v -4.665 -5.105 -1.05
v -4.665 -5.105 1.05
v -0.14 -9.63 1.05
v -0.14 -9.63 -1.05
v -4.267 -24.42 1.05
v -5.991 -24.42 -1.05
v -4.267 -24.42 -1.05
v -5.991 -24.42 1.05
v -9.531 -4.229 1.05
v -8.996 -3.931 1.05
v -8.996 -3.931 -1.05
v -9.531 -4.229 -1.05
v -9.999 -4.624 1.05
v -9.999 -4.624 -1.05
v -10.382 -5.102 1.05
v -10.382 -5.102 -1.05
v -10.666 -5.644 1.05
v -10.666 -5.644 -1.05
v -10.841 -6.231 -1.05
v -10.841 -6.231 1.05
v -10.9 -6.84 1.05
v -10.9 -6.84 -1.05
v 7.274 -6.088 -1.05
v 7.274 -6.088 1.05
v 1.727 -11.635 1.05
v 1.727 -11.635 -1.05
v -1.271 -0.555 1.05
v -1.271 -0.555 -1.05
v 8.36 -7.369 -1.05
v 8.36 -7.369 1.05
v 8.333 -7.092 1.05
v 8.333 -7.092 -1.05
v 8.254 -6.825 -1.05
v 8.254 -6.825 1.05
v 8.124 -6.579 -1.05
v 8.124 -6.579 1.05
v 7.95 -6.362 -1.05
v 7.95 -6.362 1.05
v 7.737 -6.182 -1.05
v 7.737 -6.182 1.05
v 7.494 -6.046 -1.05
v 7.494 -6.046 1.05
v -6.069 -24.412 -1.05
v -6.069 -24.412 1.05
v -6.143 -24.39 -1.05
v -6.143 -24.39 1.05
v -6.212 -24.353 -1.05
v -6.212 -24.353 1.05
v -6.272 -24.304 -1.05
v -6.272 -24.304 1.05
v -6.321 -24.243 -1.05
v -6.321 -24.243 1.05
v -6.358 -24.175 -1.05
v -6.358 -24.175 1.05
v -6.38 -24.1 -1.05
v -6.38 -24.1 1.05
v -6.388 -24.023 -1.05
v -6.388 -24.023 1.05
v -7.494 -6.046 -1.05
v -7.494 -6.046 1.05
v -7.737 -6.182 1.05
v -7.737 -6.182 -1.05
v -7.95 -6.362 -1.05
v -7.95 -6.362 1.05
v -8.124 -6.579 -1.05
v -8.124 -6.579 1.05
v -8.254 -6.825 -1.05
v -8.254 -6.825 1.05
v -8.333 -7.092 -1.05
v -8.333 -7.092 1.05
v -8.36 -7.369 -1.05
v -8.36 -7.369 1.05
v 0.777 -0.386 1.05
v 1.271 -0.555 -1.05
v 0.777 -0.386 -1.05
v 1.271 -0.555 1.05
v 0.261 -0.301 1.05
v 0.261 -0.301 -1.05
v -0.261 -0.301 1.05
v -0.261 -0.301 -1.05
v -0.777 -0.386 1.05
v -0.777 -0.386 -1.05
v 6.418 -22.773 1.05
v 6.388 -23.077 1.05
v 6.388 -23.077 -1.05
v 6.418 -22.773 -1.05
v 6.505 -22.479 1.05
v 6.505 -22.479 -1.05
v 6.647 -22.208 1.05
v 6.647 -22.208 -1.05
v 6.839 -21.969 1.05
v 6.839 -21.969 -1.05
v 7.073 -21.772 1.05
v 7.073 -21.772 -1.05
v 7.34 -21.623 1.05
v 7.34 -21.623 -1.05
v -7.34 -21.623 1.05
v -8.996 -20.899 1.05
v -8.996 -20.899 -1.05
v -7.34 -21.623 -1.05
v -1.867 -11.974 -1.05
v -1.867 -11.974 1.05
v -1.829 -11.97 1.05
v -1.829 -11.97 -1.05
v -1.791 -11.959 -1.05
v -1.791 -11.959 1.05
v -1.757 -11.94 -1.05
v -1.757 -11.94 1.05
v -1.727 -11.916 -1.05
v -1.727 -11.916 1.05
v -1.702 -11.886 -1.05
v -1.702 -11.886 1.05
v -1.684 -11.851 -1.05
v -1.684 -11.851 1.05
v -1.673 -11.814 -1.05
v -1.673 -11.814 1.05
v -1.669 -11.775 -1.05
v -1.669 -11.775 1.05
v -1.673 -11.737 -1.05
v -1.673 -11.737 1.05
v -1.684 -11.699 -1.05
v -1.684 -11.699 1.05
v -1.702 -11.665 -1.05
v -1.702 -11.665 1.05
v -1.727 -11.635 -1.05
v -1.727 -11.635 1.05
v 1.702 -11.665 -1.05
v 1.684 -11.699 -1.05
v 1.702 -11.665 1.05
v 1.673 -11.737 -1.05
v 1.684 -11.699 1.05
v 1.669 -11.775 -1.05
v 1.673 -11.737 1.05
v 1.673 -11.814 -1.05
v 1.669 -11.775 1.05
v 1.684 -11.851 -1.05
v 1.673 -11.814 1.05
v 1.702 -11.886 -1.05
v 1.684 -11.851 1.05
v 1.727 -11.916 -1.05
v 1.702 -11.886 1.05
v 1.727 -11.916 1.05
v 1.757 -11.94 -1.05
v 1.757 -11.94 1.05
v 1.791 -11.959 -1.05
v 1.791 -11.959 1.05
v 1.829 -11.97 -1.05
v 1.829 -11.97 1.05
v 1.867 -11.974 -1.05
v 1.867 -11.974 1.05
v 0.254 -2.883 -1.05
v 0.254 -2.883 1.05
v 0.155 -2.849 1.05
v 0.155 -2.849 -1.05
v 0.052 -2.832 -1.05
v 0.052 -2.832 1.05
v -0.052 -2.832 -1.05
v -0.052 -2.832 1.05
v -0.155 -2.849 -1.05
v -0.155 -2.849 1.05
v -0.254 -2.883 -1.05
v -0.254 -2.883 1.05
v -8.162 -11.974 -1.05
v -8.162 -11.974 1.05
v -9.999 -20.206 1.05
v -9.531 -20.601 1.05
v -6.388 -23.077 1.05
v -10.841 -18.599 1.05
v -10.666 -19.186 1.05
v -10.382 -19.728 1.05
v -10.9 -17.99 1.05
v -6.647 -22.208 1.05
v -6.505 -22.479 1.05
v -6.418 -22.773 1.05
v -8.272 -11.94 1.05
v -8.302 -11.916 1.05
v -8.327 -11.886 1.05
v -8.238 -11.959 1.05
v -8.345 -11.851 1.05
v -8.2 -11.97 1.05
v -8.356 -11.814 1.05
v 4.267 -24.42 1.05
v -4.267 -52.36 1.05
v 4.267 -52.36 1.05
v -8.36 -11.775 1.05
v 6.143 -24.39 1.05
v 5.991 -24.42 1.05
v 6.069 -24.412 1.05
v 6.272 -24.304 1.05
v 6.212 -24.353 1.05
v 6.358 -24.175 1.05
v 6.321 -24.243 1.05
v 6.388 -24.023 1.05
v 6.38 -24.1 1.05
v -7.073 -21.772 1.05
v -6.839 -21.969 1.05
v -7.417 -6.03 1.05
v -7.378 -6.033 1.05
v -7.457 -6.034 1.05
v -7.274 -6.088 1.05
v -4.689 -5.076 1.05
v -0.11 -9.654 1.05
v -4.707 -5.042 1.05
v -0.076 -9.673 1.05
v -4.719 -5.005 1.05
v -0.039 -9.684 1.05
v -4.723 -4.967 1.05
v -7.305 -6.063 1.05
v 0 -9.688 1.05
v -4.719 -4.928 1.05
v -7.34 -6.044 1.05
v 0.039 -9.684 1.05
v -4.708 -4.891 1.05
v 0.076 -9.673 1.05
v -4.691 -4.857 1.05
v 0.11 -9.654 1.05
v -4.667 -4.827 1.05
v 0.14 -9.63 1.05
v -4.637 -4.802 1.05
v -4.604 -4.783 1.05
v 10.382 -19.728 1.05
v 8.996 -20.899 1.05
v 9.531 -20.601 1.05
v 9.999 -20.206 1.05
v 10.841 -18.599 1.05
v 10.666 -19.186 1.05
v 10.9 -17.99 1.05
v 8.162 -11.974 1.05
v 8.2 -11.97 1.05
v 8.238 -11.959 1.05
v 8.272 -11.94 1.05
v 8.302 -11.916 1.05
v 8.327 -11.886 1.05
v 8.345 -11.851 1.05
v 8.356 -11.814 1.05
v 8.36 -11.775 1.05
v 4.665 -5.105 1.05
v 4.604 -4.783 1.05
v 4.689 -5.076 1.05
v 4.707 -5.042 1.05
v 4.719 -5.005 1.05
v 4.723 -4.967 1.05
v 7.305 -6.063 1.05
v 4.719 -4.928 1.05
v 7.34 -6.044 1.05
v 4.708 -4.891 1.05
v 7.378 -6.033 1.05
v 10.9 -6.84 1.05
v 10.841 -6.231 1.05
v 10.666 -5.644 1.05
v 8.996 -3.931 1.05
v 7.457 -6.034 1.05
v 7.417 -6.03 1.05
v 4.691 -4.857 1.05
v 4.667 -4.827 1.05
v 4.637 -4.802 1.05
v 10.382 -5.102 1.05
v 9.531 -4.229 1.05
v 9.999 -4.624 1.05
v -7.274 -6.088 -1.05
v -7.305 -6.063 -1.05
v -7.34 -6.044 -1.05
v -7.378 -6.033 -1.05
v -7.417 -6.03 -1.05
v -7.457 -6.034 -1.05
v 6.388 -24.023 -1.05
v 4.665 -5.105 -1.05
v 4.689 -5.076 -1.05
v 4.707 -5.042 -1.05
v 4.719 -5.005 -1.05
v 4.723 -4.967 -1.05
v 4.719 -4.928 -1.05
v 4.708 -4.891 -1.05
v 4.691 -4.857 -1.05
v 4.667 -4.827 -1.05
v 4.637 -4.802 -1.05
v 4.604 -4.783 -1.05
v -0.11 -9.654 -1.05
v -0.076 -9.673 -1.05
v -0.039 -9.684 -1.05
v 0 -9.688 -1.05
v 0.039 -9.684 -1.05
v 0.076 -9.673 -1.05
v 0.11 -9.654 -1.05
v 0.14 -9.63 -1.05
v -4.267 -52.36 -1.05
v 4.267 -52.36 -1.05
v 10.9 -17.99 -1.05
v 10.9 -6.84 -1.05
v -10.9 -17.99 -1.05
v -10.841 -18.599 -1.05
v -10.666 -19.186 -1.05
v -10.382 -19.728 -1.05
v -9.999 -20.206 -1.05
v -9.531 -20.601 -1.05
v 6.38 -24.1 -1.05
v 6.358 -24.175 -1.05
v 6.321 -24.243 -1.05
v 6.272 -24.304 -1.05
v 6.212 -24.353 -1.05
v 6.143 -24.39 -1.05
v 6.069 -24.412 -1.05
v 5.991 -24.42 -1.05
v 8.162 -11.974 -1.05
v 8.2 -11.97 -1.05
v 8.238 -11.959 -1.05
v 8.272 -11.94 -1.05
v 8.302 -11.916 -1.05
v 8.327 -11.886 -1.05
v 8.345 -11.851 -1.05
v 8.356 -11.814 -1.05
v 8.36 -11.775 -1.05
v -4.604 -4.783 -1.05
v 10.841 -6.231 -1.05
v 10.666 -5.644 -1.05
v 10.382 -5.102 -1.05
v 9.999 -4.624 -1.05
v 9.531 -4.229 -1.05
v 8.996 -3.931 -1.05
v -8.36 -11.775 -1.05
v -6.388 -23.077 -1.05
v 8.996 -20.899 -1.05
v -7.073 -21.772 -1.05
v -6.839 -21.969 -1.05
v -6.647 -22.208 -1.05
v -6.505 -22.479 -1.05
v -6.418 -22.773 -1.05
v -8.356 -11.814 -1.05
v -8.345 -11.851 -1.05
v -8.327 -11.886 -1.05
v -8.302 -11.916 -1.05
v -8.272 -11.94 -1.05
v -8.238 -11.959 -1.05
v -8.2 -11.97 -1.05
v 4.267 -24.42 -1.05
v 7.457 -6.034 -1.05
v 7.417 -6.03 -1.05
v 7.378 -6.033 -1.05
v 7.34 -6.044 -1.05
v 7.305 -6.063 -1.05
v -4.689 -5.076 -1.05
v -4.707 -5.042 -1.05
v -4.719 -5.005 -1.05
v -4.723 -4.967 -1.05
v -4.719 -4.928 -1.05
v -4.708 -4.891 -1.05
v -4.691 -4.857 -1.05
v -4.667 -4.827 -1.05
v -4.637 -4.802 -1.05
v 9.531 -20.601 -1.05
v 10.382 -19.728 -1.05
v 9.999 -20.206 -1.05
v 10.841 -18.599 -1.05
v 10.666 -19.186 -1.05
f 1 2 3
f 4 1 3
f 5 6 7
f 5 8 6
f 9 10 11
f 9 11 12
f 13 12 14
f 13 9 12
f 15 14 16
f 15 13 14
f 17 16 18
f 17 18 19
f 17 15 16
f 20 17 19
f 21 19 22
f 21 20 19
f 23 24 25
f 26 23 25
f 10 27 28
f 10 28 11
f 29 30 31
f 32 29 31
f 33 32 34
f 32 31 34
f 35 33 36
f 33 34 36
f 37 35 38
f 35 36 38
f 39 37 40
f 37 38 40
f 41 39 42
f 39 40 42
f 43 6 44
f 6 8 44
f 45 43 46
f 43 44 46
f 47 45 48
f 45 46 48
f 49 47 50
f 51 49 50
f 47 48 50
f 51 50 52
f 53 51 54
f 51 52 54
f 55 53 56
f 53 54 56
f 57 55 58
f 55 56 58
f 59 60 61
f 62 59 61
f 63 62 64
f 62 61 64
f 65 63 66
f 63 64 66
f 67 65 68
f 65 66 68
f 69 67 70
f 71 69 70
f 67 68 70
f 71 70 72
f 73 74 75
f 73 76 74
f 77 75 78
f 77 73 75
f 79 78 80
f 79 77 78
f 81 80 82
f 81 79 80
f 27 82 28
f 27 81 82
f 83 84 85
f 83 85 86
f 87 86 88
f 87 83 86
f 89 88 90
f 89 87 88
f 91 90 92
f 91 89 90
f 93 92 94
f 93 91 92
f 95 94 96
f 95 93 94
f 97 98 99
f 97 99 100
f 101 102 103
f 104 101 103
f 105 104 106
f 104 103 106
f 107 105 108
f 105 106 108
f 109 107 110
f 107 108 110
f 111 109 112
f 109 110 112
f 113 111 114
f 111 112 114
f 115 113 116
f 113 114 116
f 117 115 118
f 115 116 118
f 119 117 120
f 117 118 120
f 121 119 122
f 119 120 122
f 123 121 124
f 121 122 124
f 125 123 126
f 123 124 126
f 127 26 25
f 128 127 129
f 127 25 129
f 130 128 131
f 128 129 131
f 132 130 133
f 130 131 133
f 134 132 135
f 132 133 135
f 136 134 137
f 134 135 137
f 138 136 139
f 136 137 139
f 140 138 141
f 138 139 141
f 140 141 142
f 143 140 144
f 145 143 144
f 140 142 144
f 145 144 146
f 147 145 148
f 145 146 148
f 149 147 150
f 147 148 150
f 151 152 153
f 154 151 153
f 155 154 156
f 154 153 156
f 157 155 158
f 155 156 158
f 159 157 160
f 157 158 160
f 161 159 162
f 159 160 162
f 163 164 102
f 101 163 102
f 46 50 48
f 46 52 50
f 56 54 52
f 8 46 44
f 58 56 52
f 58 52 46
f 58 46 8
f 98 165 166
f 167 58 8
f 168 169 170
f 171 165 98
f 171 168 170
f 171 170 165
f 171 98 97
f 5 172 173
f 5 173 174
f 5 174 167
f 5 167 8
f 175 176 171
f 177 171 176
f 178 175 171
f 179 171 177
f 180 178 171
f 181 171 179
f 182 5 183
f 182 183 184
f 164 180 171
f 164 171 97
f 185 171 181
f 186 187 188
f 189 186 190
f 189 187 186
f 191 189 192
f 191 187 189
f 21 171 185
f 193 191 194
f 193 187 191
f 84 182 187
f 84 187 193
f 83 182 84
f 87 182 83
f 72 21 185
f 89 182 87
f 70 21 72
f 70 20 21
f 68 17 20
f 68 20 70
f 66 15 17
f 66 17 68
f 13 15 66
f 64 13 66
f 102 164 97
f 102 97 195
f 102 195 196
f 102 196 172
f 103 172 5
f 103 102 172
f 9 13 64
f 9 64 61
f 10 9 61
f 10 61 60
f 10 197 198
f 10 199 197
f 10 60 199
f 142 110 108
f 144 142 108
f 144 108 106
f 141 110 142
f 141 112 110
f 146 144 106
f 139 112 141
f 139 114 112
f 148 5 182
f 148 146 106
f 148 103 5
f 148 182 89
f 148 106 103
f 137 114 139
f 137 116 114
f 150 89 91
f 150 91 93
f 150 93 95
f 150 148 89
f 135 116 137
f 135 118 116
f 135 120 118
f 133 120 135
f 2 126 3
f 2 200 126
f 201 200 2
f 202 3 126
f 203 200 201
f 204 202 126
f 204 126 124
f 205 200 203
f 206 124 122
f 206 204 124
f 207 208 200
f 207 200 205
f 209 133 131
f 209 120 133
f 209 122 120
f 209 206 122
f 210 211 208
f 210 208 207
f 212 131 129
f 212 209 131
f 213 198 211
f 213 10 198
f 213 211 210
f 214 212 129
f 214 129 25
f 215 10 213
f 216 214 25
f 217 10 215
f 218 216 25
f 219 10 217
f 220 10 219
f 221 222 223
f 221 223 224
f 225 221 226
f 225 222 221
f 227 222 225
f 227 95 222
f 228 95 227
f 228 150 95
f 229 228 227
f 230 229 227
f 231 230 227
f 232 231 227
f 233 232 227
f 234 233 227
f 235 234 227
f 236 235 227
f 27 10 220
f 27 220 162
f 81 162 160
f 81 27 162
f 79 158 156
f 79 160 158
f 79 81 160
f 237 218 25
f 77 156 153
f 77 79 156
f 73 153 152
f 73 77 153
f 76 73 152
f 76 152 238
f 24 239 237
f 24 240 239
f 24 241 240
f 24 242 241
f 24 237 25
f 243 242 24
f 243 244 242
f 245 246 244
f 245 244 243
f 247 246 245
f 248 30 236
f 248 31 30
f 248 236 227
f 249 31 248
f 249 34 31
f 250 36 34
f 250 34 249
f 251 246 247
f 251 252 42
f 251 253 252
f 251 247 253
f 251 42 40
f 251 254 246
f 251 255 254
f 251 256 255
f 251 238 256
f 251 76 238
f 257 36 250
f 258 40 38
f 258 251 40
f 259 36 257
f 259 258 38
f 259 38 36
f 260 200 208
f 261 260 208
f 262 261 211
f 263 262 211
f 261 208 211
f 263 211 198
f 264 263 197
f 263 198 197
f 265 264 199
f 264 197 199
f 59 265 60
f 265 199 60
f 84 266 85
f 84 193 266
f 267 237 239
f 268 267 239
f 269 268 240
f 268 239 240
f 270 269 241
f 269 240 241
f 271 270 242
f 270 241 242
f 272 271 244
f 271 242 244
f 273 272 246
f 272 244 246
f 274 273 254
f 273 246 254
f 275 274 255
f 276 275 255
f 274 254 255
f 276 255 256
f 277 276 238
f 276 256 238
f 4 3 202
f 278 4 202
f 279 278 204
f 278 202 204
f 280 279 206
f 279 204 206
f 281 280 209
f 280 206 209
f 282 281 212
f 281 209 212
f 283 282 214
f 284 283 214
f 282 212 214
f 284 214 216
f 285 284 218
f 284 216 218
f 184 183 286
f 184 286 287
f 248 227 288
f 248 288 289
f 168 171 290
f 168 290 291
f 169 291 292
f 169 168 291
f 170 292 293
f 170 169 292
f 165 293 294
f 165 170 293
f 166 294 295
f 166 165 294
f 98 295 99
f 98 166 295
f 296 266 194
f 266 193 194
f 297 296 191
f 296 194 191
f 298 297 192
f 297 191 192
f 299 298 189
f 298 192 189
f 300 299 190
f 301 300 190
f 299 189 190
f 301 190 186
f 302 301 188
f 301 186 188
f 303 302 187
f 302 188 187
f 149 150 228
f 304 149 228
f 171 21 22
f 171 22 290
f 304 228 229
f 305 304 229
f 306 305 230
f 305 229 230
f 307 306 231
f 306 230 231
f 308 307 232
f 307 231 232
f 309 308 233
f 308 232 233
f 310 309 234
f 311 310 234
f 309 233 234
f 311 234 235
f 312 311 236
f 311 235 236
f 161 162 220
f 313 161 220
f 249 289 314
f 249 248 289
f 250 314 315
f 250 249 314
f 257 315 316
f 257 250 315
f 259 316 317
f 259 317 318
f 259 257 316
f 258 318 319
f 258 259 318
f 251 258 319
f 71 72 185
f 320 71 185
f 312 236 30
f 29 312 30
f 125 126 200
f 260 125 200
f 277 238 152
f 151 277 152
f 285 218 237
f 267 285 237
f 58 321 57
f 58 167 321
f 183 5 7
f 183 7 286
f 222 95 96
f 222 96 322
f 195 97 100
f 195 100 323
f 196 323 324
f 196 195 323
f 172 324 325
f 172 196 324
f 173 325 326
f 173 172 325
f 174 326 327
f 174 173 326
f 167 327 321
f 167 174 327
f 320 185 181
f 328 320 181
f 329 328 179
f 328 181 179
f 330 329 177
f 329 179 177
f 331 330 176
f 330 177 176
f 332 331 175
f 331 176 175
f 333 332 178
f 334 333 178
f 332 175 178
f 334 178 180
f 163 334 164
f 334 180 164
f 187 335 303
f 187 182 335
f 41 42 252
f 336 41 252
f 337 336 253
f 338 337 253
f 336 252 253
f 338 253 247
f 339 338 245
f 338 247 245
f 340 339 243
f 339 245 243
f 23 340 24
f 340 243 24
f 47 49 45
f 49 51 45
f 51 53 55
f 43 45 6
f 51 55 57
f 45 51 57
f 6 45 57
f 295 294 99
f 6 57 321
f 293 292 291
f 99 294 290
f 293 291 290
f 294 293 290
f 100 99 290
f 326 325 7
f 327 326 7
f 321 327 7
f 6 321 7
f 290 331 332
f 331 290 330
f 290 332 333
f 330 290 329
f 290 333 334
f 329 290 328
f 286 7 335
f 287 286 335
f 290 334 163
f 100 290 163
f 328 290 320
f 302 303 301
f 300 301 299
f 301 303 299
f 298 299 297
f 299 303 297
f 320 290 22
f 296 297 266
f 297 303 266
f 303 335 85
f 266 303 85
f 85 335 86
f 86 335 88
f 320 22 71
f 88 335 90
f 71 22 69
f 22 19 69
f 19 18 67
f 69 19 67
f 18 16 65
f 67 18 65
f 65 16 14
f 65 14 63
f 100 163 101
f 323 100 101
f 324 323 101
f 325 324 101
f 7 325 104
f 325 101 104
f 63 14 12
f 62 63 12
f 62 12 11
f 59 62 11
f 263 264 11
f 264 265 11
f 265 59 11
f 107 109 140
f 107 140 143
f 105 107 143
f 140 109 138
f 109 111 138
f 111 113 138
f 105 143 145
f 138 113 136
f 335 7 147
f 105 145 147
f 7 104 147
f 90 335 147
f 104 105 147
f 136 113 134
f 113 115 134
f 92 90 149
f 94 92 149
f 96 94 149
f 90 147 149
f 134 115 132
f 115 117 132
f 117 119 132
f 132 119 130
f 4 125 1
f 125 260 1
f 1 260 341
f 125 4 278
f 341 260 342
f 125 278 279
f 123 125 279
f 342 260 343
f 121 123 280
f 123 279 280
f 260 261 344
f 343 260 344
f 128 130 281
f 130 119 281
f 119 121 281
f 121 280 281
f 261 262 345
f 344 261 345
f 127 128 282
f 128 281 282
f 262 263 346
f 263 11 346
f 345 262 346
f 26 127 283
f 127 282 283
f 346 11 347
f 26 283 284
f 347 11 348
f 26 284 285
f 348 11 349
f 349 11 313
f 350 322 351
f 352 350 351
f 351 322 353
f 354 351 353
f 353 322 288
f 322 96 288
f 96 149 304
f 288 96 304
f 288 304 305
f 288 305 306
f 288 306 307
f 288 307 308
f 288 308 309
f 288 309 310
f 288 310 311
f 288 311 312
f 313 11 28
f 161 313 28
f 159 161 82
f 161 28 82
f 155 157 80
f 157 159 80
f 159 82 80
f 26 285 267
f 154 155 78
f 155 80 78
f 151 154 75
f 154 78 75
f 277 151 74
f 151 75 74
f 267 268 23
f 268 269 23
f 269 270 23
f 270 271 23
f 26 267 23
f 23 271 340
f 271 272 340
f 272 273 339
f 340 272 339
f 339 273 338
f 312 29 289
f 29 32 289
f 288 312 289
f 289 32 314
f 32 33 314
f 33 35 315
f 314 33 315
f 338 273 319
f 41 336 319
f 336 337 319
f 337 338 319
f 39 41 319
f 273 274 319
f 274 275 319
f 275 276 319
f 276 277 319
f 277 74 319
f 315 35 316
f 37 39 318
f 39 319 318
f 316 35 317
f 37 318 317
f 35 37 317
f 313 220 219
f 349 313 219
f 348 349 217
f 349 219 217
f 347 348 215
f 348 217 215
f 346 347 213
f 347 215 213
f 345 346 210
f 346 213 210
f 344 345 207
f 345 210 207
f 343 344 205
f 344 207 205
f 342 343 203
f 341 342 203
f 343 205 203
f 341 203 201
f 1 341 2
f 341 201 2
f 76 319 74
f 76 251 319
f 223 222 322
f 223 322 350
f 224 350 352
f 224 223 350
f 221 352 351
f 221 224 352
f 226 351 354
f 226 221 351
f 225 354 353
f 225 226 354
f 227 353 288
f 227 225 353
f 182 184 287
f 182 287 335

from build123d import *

# Parameters (mm, degrees)
F1_DEPTH = 1.05
F2_R     = 0.396875
F4_DEPTH = 2.101


with BuildPart() as f1:
    # F0 (on Top) → F1 (new body, symmetric)
    with BuildSketch(Plane.XY):
        with BuildLine():
            ThreePointArc((1.2711994223, -0.5554208485), (0, -0.2898326497), (-1.2711994223, -0.5554208485))
            Line((-1.2711994223, -0.5554208485), (-8.9961994223, -3.930678876))
            ThreePointArc((-8.9961994223, -3.930678876), (-10.381753956, -5.1016191022), (-10.9, -6.8400906772))
            Line((-10.9, -6.8400906772), (-10.9, -17.9896228211))
            ThreePointArc((-10.9, -17.9896228211), (-10.381753956, -19.7280943961), (-8.9961994223, -20.8990346223))
            Line((-8.9961994223, -20.8990346223), (-7.3400002889, -21.6226720877))
            ThreePointArc((-7.3400002889, -21.6226720877), (-6.647223022, -22.2081422008), (-6.3881, -23.0773779883))
            Line((-6.3881, -23.0773779883), (-6.3881, -24.4198326497))
            Line((-6.3881, -24.4198326497), (-4.2672, -24.4198326497))
            Line((-4.2672, -24.4198326497), (-4.2672, -52.3598326497))
            Line((-4.2672, -52.3598326497), (4.2672, -52.3598326497))
            Line((4.2672, -52.3598326497), (4.2672, -24.4198326497))
            Line((4.2672, -24.4198326497), (6.3881, -24.4198326497))
            Line((6.3881, -24.4198326497), (6.3881, -23.0773779883))
            ThreePointArc((6.3881, -23.0773779883), (6.647223022, -22.2081422008), (7.3400002889, -21.6226720877))
            Line((7.3400002889, -21.6226720877), (8.9961994223, -20.8990346223))
            ThreePointArc((8.9961994223, -20.8990346223), (10.381753956, -19.7280943961), (10.9, -17.9896228211))
            Line((10.9, -17.9896228211), (10.9, -6.8400906772))
            ThreePointArc((10.9, -6.8400906772), (10.381753956, -5.1016191022), (8.9961994223, -3.930678876))
            Line((8.9961994223, -3.930678876), (1.2711994223, -0.5554208485))
        make_face()
    extrude(amount=F1_DEPTH, both=True)

    # F2
    f2_edges = [f1.edges().sort_by_distance(p)[0] for p in [
        (6.3881, -24.419833, 0),
        (-6.3881, -24.419833, 0),
    ]]
    fillet(f2_edges, radius=F2_R)

    # F3 (on face) → F4 (cut, through all)
    with BuildSketch(Plane.XY.offset(1.05)):
        with BuildLine():
            ThreePointArc((0.2542398845, -2.8829502894), (0, -2.8298326497), (-0.2542398845, -2.8829502894))
            Line((-0.2542398845, -2.8829502894), (-4.6036733755, -4.7833335005))
            ThreePointArc((-4.6036733755, -4.7833335005), (-4.7192112161, -4.9283315767), (-4.6645399135, -5.10548824))
            Line((-4.6645399135, -5.10548824), (-0.1403165019, -9.6297116516))
            ThreePointArc((-0.1403165019, -9.6297116516), (0, -9.6878326497), (0.1403165019, -9.6297116516))
            Line((0.1403165019, -9.6297116516), (4.6645399135, -5.10548824))
            ThreePointArc((4.6645399135, -5.10548824), (4.7192112161, -4.9283315767), (4.6036733755, -4.7833335005))
            Line((4.6036733755, -4.7833335005), (0.2542398845, -2.8829502894))
        make_face()
        with BuildLine():
            ThreePointArc((-7.4941261238, -6.0462492082), (-8.1242947921, -6.5788084291), (-8.36, -7.3694884715))
            Line((-8.36, -7.3694884715), (-8.36, -11.7753951497))
            ThreePointArc((-8.36, -11.7753951497), (-8.3018790019, -11.9157116516), (-8.1615625, -11.9738326497))
            Line((-8.1615625, -11.9738326497), (-1.867368456, -11.9738326497))
            ThreePointArc((-1.867368456, -11.9738326497), (-1.6840361113, -11.8513338933), (-1.7270519541, -11.6350786478))
            Line((-1.7270519541, -11.6350786478), (-7.274359658, -6.0877709439))
            ThreePointArc((-7.274359658, -6.0877709439), (-7.3778359984, -6.0330996413), (-7.4941261238, -6.0462492082))
        make_face()
        with BuildLine():
            Line((8.36, -11.7753951497), (8.36, -7.3694884715))
            ThreePointArc((8.36, -7.3694884715), (8.1242947921, -6.5788084291), (7.4941261238, -6.0462492082))
            ThreePointArc((7.4941261238, -6.0462492082), (7.3778359984, -6.0330996413), (7.274359658, -6.0877709439))
            Line((7.274359658, -6.0877709439), (1.7270519541, -11.6350786478))
            ThreePointArc((1.7270519541, -11.6350786478), (1.6840361113, -11.8513338933), (1.867368456, -11.9738326497))
            Line((1.867368456, -11.9738326497), (8.1615625, -11.9738326497))
            ThreePointArc((8.1615625, -11.9738326497), (8.3018790019, -11.9157116516), (8.36, -11.7753951497))
        make_face()
    extrude(amount=-F4_DEPTH, mode=Mode.SUBTRACT)


solid = f1.part
